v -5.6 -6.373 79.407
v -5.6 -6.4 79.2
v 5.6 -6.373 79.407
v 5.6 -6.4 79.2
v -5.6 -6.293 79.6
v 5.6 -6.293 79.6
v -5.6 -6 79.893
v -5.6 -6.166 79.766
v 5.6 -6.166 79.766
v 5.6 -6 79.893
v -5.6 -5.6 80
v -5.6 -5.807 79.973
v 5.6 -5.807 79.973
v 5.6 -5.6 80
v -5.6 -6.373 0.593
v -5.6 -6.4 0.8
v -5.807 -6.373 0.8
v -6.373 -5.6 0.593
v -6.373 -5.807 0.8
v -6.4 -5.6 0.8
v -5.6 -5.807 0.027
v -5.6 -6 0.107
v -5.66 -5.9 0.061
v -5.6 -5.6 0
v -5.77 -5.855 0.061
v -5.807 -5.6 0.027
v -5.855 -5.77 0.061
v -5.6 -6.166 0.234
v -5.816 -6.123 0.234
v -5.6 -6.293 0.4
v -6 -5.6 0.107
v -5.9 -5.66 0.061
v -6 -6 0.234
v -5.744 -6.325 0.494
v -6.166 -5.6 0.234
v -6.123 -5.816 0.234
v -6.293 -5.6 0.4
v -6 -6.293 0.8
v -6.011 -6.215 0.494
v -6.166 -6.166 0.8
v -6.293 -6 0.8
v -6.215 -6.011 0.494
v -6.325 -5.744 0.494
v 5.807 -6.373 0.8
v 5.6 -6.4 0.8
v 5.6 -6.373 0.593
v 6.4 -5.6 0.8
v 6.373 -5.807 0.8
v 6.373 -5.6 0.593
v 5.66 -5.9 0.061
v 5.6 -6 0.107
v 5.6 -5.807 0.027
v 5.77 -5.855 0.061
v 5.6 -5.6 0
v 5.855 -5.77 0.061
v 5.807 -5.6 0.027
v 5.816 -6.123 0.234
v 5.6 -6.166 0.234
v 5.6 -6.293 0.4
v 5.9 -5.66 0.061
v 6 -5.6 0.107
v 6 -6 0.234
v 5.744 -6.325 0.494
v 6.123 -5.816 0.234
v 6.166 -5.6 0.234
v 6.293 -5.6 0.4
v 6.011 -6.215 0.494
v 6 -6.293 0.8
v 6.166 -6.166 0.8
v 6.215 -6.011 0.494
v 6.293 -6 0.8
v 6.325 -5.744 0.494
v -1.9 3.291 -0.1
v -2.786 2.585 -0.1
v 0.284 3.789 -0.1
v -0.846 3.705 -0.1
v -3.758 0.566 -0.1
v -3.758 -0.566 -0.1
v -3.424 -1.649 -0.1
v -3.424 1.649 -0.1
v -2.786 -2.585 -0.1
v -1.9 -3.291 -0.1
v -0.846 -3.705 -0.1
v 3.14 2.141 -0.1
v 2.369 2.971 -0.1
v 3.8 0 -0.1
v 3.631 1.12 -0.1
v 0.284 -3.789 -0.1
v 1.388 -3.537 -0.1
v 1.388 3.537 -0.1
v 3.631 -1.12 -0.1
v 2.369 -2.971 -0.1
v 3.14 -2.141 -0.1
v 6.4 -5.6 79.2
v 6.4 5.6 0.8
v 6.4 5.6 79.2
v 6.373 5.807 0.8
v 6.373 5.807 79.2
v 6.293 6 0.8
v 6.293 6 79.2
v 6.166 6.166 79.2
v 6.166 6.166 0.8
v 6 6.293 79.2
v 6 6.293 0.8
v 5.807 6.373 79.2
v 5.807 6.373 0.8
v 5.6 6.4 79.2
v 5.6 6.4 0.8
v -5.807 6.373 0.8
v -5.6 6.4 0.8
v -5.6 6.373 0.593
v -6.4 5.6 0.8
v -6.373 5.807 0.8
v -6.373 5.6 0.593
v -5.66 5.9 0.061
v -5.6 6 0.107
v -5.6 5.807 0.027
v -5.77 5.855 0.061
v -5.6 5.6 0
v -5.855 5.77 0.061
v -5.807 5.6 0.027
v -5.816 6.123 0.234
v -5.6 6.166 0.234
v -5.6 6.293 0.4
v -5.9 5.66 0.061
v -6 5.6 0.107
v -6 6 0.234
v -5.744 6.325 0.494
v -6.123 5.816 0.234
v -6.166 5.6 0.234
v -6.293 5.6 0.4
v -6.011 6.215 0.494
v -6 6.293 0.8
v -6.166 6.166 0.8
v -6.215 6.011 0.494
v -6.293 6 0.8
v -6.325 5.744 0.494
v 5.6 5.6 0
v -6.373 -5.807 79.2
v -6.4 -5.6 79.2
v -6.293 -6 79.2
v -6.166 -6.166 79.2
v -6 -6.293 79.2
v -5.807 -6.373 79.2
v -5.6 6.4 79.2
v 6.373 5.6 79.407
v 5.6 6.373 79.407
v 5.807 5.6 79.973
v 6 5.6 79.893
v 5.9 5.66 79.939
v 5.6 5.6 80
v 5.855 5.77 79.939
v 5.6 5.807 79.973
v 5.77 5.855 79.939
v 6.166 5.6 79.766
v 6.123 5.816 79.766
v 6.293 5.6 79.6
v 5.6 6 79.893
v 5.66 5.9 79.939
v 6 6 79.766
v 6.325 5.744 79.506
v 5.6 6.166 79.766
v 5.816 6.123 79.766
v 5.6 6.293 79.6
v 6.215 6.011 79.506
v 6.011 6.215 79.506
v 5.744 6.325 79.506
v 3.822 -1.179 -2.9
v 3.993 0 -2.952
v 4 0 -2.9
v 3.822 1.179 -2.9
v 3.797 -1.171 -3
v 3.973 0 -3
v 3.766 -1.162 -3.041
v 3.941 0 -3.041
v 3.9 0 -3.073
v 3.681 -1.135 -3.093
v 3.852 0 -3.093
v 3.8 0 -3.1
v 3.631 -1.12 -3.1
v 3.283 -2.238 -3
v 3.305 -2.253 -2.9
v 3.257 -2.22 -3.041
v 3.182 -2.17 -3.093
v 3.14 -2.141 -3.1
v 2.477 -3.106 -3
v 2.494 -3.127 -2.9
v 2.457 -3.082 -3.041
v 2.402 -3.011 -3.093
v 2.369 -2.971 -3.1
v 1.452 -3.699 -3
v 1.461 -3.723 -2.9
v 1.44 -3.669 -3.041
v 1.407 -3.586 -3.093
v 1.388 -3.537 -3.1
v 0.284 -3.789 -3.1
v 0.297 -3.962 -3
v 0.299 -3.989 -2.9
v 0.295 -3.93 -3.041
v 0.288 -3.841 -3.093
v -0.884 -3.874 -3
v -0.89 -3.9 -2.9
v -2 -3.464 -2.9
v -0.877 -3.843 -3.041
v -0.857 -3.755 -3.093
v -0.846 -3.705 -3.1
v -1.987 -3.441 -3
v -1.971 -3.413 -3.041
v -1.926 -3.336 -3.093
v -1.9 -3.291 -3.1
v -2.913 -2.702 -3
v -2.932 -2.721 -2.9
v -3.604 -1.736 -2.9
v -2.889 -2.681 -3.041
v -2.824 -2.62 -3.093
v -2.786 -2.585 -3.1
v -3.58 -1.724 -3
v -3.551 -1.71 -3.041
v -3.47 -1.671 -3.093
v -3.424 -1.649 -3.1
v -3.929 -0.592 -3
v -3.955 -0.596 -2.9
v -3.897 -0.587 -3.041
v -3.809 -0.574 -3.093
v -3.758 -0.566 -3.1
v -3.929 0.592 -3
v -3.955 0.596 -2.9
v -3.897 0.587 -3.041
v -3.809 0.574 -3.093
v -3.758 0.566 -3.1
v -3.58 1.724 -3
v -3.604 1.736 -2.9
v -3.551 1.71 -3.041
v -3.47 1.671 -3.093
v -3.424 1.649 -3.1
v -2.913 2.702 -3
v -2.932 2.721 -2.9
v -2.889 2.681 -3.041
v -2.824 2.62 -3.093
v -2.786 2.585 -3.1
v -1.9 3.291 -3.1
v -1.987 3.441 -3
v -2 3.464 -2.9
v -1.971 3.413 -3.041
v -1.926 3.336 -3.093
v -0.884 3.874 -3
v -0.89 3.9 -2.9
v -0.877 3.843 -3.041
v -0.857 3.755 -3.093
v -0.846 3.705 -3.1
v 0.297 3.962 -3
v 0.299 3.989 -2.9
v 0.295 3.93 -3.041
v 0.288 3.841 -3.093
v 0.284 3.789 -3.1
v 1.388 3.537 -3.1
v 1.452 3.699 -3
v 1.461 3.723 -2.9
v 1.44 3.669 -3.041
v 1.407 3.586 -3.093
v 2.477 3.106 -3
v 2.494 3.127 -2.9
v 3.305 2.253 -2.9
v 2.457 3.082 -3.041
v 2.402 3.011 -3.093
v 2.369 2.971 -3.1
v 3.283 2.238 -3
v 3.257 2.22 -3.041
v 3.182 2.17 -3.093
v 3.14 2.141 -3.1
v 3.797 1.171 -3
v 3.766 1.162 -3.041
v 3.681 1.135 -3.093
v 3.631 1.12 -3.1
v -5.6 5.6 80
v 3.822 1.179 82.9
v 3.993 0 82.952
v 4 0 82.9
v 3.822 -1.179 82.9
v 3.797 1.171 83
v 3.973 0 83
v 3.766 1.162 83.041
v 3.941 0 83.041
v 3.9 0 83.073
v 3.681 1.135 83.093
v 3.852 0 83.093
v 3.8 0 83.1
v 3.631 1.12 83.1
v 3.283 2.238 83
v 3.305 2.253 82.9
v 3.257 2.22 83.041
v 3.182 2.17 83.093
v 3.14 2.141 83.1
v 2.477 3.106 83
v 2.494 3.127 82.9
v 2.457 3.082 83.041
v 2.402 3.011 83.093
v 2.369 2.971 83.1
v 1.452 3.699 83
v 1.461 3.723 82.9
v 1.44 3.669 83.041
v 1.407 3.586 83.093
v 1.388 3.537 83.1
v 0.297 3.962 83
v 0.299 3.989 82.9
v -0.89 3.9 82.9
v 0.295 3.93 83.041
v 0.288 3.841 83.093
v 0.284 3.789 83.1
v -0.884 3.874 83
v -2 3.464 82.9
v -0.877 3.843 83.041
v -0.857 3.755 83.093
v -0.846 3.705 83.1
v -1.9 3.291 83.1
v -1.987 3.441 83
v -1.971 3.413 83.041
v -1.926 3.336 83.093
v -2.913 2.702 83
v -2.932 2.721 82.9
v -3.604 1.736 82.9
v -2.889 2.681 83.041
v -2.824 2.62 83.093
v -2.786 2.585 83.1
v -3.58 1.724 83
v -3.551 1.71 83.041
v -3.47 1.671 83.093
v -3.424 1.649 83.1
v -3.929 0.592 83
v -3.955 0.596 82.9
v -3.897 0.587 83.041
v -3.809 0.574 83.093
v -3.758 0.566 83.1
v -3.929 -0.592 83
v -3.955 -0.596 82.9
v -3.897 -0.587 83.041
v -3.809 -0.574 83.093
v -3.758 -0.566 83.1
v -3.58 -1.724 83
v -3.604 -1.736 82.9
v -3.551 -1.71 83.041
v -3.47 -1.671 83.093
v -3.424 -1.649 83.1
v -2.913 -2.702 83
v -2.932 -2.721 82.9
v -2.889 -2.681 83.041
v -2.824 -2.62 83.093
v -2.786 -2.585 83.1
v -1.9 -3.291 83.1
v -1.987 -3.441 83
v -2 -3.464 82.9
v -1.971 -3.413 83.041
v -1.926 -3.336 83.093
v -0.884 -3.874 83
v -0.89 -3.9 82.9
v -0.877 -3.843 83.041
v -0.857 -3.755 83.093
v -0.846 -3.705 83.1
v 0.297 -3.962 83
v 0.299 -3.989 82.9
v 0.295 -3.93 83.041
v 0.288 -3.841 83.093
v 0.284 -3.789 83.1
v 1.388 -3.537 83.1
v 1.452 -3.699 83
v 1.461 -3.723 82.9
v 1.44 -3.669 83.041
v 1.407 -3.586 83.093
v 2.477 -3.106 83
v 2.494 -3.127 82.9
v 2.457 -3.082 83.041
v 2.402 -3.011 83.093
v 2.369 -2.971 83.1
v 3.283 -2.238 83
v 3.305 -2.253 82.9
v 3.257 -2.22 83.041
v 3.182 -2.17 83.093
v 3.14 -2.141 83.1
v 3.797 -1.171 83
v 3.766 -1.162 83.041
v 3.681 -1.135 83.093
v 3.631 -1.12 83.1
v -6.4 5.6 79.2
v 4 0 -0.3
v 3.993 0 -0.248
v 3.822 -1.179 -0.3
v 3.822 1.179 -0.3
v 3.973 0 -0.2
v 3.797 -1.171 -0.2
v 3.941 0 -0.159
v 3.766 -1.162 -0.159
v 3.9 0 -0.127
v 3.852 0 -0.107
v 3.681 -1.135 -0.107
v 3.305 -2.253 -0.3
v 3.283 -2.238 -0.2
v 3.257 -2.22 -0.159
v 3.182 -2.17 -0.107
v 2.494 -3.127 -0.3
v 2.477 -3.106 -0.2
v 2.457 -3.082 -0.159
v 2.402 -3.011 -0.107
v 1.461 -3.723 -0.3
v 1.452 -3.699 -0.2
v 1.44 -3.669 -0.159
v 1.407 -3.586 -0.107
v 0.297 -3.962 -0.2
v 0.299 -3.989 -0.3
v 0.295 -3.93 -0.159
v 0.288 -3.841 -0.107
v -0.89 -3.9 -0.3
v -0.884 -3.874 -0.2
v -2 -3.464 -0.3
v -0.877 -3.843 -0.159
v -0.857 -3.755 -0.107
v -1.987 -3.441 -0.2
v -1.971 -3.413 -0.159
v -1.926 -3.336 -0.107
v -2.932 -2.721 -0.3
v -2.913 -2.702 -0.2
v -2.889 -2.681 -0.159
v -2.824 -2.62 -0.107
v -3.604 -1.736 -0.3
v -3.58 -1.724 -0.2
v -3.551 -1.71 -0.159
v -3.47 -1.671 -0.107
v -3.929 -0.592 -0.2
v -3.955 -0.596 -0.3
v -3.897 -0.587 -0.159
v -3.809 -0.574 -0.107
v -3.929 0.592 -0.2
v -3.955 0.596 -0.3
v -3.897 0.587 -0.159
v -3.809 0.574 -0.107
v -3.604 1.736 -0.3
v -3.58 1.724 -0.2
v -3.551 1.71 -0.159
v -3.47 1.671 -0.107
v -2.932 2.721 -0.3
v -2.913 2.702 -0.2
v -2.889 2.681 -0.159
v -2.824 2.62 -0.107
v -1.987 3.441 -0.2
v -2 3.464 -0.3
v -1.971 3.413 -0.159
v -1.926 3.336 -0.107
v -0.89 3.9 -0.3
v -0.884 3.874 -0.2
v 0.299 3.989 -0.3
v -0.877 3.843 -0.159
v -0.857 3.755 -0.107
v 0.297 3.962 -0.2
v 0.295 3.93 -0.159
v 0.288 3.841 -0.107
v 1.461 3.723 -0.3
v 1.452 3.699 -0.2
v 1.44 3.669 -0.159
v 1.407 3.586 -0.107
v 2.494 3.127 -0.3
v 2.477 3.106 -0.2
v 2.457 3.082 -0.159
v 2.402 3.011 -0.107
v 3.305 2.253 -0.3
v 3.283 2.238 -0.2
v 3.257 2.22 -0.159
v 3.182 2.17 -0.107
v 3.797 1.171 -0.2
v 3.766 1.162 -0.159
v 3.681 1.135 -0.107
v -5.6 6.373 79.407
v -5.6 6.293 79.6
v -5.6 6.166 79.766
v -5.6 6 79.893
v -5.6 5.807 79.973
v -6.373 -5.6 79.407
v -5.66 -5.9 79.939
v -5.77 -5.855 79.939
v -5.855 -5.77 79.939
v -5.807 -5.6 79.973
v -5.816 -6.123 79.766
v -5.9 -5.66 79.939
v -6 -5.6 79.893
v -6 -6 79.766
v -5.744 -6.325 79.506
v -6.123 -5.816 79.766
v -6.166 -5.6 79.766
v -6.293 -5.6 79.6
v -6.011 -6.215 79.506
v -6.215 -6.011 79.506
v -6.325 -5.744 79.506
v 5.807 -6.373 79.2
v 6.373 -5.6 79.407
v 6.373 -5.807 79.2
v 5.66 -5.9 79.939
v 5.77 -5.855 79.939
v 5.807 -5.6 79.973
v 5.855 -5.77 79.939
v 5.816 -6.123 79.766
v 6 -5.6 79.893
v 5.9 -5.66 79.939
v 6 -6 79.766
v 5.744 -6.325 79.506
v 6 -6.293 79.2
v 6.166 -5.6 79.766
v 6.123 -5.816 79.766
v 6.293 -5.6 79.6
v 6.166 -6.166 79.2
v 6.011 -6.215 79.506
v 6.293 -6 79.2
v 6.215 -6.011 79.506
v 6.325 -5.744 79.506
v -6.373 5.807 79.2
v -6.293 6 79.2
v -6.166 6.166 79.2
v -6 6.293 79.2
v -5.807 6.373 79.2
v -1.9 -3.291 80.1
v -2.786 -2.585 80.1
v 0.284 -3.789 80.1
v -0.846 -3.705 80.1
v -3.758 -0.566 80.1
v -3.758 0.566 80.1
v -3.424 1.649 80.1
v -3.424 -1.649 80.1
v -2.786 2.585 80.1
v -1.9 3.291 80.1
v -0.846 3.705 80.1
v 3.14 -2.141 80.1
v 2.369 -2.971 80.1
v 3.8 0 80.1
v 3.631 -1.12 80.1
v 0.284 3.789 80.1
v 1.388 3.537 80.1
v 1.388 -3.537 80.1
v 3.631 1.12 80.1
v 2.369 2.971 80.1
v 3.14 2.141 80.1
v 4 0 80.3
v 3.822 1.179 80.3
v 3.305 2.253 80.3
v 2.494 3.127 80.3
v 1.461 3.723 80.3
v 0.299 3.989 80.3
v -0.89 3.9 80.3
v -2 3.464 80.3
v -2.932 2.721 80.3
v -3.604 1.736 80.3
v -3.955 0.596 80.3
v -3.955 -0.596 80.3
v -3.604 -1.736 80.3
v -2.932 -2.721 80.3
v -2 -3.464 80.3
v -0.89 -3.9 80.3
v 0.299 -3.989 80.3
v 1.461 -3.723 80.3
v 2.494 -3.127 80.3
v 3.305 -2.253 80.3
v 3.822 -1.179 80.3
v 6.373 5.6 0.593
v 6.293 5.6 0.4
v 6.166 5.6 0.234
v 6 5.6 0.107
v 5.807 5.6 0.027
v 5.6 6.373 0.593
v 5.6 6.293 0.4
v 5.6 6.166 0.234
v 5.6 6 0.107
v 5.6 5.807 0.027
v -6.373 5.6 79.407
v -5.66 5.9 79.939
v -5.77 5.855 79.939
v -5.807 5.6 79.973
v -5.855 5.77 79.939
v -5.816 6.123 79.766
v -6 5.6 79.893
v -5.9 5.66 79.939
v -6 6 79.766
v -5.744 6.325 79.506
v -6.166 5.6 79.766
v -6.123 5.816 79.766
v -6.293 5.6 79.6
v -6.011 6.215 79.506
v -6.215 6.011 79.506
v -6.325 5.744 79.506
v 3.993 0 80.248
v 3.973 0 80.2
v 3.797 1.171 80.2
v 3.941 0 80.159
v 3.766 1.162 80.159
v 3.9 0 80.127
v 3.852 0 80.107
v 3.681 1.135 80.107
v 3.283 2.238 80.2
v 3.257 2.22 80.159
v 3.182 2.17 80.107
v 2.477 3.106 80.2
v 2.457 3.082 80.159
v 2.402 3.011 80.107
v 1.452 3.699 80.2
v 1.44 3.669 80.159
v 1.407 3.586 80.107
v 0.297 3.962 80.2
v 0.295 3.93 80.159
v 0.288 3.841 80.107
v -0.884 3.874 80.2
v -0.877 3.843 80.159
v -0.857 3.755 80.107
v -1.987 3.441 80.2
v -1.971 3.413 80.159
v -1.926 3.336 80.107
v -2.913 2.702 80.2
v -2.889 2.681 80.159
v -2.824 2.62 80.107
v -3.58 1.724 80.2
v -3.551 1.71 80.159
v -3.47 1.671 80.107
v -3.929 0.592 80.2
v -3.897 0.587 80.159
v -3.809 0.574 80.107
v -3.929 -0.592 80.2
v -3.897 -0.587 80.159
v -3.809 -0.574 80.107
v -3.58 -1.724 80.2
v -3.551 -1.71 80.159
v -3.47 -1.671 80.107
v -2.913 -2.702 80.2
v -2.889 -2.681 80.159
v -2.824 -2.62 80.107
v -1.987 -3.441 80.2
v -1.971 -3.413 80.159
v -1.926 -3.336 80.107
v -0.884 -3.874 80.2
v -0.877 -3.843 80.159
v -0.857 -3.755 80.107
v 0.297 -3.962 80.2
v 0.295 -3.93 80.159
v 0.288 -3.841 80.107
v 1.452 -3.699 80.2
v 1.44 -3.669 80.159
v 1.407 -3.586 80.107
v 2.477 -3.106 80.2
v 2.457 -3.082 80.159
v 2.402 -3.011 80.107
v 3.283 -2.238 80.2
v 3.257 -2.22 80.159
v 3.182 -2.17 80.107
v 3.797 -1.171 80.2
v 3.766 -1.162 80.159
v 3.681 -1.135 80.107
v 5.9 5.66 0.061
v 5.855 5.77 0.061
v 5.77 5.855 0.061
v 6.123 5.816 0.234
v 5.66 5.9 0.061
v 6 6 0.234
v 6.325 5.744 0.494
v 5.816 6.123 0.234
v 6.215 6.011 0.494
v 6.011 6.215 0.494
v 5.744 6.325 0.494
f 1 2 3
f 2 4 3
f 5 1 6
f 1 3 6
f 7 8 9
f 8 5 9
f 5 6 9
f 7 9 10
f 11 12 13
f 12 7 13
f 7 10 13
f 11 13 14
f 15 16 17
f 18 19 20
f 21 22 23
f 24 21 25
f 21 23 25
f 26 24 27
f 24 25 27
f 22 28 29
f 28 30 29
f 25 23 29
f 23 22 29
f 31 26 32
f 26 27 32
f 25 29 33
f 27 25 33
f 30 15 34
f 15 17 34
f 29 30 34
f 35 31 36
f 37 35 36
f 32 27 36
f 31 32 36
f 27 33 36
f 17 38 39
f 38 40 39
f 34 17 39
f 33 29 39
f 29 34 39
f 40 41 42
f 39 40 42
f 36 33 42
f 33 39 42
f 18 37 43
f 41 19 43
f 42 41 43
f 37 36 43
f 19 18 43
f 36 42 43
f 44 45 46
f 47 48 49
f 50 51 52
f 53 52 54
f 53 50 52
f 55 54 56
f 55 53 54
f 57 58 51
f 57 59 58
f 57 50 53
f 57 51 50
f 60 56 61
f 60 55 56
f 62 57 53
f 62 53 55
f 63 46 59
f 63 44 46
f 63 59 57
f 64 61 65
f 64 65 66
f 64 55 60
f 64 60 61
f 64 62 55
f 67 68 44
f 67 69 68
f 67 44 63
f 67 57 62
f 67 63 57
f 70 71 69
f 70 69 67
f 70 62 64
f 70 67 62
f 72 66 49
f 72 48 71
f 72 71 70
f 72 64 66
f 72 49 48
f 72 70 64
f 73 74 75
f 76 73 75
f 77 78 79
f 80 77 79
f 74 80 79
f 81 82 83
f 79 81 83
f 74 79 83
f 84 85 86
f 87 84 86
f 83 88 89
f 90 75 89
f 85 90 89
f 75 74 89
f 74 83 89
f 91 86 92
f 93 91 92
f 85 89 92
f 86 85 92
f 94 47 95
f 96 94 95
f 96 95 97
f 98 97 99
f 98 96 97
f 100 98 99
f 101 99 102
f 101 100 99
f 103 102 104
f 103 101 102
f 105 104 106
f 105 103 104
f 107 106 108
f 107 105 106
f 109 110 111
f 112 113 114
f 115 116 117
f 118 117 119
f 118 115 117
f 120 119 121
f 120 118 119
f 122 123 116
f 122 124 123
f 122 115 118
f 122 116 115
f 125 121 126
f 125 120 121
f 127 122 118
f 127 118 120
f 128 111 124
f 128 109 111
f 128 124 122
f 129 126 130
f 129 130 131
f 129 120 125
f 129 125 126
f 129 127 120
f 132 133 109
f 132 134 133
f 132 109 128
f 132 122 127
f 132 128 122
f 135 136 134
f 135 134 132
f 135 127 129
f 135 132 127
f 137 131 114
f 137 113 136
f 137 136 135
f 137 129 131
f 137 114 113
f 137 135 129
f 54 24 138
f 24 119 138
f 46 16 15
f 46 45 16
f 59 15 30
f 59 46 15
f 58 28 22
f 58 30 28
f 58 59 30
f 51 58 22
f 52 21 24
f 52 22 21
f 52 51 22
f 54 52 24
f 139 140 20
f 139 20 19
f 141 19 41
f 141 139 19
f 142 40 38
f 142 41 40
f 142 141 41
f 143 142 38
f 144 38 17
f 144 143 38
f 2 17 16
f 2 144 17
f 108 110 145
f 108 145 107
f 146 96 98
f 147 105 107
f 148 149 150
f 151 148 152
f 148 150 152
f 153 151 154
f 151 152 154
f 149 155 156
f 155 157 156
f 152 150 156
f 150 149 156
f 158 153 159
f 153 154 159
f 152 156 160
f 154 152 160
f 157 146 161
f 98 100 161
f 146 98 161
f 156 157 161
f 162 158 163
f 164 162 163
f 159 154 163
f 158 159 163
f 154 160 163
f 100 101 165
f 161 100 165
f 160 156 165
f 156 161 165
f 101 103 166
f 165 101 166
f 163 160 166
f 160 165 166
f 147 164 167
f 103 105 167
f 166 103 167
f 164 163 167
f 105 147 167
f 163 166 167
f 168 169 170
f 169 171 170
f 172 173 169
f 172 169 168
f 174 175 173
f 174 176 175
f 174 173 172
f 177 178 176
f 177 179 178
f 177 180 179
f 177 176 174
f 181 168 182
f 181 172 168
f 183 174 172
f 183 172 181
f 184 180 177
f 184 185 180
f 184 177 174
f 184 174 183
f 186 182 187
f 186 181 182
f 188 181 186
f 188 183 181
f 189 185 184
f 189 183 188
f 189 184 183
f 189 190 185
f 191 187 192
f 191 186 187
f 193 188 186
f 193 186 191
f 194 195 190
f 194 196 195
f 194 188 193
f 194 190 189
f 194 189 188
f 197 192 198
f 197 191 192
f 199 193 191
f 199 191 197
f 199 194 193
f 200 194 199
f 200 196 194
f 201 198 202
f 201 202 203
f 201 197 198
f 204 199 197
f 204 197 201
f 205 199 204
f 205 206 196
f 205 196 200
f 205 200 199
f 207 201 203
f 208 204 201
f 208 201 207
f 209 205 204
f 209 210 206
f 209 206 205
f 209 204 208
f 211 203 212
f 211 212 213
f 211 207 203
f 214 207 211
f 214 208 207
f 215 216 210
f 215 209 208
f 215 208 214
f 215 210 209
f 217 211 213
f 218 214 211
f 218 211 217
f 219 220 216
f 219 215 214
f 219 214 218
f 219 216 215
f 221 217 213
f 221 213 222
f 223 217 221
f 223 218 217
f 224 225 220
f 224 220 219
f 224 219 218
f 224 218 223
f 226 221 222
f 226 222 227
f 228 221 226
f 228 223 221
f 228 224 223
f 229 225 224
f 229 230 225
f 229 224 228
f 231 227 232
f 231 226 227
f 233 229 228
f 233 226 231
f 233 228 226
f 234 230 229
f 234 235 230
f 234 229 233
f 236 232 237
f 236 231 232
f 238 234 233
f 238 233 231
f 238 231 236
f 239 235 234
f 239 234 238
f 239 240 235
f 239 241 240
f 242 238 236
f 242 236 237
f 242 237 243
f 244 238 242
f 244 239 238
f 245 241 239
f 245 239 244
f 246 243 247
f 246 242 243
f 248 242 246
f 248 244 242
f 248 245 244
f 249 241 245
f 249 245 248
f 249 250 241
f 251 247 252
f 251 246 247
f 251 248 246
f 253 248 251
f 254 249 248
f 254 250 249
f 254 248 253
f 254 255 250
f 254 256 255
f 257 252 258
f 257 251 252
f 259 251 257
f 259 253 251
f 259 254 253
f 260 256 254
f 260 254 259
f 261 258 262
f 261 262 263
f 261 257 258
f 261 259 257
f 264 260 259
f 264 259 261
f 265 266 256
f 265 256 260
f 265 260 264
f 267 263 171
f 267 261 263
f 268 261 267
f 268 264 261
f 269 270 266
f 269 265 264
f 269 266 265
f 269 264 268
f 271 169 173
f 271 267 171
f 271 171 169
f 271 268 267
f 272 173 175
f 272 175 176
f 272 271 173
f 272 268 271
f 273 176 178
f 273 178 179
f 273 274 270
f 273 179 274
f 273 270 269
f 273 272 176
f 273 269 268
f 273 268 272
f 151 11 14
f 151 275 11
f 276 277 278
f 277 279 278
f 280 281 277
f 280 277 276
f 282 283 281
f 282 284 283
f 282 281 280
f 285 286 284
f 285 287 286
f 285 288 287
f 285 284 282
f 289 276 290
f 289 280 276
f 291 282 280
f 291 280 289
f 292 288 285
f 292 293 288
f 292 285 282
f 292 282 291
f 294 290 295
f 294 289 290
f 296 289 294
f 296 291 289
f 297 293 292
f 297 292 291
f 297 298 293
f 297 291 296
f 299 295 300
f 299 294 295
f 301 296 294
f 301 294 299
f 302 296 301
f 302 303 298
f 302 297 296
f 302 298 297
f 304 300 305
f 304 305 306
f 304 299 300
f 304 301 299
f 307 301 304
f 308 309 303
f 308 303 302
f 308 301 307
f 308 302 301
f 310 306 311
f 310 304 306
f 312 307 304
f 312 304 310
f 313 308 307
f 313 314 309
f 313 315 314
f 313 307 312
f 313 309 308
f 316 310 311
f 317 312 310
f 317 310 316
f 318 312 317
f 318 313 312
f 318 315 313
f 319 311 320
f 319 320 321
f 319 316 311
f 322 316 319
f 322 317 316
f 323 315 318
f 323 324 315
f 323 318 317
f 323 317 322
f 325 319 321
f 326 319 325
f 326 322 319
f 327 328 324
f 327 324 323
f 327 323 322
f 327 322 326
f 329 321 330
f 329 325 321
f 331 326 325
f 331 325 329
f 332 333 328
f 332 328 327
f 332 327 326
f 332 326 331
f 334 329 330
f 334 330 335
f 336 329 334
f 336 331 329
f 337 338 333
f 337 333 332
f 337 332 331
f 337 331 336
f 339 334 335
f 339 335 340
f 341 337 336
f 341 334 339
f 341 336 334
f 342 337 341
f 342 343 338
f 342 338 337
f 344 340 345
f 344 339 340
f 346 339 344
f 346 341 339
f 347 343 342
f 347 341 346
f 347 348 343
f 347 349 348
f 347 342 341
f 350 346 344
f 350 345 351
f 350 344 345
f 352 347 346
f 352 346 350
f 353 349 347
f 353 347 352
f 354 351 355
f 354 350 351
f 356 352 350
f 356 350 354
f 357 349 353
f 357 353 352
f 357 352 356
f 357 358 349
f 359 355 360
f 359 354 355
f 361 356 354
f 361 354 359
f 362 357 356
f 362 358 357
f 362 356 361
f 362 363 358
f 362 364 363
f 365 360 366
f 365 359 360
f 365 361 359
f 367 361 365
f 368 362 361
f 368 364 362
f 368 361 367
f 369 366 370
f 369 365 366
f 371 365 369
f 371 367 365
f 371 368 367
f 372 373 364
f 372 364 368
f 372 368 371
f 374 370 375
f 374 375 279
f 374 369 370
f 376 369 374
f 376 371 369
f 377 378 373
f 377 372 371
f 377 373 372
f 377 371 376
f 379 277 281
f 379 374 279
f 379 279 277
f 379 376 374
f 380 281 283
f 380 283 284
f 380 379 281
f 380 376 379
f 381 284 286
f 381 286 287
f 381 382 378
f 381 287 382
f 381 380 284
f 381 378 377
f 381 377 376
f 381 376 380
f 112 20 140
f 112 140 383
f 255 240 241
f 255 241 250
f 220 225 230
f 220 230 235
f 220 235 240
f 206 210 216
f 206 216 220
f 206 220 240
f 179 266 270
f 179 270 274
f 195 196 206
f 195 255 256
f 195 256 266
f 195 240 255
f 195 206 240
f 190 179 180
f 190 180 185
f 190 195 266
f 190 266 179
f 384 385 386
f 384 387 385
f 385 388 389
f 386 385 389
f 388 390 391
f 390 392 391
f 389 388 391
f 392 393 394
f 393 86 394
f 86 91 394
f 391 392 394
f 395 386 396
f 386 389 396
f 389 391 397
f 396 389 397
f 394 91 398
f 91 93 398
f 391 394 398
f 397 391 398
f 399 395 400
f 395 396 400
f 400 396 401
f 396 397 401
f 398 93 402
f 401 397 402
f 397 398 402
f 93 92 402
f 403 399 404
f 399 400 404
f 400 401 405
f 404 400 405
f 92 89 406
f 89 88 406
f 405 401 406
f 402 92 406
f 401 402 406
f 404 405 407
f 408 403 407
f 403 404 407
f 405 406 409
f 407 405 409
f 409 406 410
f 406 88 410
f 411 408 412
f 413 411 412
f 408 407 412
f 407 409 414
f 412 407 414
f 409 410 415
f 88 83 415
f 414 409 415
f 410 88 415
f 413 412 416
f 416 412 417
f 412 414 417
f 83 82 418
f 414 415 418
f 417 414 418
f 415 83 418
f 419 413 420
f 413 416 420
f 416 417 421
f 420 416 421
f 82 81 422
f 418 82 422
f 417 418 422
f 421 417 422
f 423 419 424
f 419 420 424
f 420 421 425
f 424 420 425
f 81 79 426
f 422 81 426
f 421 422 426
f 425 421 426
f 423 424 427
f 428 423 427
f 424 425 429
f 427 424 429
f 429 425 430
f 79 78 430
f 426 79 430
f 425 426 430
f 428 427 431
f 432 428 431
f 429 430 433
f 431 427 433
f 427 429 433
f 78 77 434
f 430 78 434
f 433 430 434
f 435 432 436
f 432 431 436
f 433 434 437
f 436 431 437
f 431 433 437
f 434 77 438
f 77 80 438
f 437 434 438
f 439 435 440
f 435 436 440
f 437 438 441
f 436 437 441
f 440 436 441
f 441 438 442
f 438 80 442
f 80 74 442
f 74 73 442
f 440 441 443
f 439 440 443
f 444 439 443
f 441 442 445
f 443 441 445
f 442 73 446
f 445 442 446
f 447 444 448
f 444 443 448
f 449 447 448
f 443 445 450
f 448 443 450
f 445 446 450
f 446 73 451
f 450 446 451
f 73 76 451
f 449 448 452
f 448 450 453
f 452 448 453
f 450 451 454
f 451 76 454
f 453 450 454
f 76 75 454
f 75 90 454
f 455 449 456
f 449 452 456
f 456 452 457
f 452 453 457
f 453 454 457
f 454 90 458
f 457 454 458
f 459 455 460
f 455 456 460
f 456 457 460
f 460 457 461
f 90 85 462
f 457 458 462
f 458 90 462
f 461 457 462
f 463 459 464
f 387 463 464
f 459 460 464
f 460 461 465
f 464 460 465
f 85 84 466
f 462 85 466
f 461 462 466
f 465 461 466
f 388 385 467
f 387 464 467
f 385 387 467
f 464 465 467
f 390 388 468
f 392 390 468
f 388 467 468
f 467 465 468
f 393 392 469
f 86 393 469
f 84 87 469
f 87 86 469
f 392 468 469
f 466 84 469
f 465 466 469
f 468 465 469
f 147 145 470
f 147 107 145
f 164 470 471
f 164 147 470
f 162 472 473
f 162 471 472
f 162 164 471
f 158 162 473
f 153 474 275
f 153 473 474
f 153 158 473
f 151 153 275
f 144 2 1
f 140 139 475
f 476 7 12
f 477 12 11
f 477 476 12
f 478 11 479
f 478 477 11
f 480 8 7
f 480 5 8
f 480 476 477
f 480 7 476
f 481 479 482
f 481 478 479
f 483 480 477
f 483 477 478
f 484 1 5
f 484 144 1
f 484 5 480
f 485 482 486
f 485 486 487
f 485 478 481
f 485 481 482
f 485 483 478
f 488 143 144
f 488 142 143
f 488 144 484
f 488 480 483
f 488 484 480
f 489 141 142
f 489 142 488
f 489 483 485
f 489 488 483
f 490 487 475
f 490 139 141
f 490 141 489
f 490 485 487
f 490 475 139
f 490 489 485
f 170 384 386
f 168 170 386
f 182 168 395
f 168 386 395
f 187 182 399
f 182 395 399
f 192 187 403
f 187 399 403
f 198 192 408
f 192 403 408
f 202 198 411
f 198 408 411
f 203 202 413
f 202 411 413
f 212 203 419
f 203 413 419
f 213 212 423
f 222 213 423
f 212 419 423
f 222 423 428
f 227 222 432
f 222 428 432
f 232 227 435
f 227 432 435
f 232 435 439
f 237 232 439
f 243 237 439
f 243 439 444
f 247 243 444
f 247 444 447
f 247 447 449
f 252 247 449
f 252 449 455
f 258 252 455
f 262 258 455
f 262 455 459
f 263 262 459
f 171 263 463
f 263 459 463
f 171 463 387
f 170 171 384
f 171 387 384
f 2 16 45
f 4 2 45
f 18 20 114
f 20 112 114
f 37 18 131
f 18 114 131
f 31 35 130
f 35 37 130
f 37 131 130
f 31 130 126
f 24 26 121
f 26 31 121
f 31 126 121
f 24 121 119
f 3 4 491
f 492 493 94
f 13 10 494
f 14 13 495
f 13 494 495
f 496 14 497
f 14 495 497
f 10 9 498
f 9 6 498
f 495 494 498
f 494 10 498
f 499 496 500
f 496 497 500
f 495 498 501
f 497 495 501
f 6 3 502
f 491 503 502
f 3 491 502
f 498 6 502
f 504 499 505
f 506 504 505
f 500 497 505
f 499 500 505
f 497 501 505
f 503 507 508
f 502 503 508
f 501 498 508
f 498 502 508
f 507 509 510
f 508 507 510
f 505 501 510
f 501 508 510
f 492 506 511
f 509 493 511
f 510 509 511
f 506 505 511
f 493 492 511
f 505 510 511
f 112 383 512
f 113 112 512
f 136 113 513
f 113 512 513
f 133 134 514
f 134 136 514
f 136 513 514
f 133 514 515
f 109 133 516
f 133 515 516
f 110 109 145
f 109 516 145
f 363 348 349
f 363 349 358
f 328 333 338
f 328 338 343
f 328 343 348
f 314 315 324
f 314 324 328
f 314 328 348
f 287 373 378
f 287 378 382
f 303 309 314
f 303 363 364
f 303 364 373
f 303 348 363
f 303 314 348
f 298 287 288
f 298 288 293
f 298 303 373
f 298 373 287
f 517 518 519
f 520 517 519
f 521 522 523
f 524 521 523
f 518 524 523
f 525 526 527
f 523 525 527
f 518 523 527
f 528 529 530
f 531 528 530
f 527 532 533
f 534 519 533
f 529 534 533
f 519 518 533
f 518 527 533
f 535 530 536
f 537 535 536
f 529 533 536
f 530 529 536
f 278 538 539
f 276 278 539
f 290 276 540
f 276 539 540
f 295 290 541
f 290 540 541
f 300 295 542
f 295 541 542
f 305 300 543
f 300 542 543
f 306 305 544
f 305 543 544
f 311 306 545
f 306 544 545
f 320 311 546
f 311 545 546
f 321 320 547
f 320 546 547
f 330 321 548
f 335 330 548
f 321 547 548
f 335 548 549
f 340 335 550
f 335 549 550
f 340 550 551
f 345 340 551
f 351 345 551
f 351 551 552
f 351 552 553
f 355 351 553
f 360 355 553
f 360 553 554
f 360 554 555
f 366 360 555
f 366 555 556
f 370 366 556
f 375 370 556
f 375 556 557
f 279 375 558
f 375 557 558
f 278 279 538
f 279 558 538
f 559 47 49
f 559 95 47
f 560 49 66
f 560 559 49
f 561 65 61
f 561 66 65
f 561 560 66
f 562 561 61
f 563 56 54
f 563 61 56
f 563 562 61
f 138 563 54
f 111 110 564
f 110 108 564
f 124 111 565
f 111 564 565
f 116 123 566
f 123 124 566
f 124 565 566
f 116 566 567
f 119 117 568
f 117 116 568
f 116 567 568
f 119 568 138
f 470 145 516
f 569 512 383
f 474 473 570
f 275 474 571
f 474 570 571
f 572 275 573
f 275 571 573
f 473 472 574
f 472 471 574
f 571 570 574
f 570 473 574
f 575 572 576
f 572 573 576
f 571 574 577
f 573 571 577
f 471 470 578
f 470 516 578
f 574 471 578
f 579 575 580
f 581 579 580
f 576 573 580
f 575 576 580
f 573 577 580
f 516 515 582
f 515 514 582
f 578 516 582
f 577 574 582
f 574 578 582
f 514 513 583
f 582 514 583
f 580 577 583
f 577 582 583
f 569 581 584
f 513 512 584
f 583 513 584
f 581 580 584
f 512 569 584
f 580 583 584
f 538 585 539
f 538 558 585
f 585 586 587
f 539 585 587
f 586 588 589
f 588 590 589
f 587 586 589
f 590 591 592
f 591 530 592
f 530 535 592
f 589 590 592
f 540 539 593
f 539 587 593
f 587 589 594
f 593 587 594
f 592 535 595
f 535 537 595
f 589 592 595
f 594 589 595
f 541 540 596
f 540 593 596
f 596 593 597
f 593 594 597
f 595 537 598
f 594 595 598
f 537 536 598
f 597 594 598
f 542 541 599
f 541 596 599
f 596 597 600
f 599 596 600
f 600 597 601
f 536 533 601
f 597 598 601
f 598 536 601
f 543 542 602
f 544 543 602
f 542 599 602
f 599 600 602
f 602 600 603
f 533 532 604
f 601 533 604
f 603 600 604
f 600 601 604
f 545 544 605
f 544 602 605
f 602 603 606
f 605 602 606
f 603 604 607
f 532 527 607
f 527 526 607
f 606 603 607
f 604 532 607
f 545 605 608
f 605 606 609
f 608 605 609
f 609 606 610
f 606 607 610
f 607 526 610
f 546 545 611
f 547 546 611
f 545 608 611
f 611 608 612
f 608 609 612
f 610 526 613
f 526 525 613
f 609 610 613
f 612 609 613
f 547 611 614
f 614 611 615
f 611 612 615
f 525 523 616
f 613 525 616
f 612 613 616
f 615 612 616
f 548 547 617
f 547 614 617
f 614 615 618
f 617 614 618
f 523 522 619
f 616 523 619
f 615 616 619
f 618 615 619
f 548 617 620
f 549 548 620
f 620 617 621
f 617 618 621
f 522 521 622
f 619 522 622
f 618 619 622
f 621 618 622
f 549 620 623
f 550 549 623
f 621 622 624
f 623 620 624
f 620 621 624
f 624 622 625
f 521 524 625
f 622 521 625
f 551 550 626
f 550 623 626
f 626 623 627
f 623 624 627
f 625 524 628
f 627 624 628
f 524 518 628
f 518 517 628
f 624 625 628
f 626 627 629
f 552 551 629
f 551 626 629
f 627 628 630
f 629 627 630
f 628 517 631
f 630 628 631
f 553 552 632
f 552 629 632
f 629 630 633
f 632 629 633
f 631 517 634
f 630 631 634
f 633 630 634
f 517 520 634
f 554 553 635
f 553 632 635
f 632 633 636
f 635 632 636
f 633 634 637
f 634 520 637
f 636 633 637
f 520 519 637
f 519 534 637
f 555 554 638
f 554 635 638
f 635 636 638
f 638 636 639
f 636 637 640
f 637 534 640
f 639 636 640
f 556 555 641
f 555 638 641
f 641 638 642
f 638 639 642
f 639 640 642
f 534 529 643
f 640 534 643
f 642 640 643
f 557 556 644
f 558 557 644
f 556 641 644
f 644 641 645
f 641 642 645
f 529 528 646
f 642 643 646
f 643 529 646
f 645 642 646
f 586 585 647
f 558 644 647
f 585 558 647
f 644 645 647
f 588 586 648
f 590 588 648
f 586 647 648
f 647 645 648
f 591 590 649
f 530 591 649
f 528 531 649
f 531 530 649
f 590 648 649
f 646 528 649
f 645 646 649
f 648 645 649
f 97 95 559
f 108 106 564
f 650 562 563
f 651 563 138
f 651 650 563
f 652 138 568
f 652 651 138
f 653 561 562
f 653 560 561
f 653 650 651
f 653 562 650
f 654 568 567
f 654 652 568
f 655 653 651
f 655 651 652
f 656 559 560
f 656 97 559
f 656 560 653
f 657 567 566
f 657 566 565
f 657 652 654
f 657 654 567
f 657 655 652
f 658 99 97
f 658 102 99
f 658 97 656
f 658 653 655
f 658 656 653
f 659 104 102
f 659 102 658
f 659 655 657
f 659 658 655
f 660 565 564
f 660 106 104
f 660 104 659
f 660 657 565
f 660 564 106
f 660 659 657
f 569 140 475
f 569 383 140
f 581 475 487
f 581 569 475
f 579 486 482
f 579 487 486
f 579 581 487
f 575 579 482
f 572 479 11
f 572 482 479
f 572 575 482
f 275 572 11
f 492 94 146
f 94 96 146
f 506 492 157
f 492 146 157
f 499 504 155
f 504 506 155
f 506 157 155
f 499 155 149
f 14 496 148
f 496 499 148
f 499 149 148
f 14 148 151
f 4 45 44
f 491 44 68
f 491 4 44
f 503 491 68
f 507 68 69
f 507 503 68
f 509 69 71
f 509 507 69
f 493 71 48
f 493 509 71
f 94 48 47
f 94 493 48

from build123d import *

# Parameters (mm, degrees)
F0_W     = 12.8
F0_H     = 12.8
F1_DEPTH = 80
F2_R     = 0.8
F4_START = 0.1
F3_R     = 4
F4_DEPTH = 3
F5_R     = 0.2
F7_START = 0.1
F6_R     = 4
F7_DEPTH = 3
F8_R     = 0.2


with BuildPart() as f1:
    # F0 (on Top) → F1 (new body)
    with BuildSketch(Plane.XY):
        Rectangle(F0_W, F0_H)
    extrude(amount=F1_DEPTH)

    # F2
    f2_edges = [f1.edges().sort_by_distance(p)[0] for p in [
        (6.4, -6.4, 40),
        (-6.4, -6.4, 40),
        (6.4, 6.4, 40),
        (-6.4, 6.4, 40),
        (0, -6.4, 0),
        (6.4, 0, 0),
        (0, 6.4, 0),
        (-6.4, 0, 0),
        (0, -6.4, 80),
        (6.4, 0, 80),
        (0, 6.4, 80),
        (-6.4, 0, 80),
    ]]
    fillet(f2_edges, radius=F2_R)


with BuildPart() as f4:
    # F3 (on face) → F4 (new body)
    with BuildSketch(Plane(origin=(0, 0, 0), x_dir=(1, 0, 0), z_dir=(0, 0, -1)).offset(F4_START)):
        Circle(F3_R)
    extrude(amount=F4_DEPTH)

    # F5
    f5_edges = [f4.edges().sort_by_distance(p)[0] for p in [
        (-4, 0, -3.1),
        (-4, 0, -0.1),
    ]]
    fillet(f5_edges, radius=F5_R)


with BuildPart() as f7:
    # F6 (on face) → F7 (new body)
    with BuildSketch(Plane.XY.offset(80).offset(F7_START)):
        Circle(F6_R)
    extrude(amount=F7_DEPTH)

    # F8
    f8_edges = [f7.edges().sort_by_distance(p)[0] for p in [
        (-4, 0, 83.1),
        (-4, 0, 80.1),
    ]]
    fillet(f8_edges, radius=F8_R)


solid = Compound([f1.part, f4.part, f7.part])
